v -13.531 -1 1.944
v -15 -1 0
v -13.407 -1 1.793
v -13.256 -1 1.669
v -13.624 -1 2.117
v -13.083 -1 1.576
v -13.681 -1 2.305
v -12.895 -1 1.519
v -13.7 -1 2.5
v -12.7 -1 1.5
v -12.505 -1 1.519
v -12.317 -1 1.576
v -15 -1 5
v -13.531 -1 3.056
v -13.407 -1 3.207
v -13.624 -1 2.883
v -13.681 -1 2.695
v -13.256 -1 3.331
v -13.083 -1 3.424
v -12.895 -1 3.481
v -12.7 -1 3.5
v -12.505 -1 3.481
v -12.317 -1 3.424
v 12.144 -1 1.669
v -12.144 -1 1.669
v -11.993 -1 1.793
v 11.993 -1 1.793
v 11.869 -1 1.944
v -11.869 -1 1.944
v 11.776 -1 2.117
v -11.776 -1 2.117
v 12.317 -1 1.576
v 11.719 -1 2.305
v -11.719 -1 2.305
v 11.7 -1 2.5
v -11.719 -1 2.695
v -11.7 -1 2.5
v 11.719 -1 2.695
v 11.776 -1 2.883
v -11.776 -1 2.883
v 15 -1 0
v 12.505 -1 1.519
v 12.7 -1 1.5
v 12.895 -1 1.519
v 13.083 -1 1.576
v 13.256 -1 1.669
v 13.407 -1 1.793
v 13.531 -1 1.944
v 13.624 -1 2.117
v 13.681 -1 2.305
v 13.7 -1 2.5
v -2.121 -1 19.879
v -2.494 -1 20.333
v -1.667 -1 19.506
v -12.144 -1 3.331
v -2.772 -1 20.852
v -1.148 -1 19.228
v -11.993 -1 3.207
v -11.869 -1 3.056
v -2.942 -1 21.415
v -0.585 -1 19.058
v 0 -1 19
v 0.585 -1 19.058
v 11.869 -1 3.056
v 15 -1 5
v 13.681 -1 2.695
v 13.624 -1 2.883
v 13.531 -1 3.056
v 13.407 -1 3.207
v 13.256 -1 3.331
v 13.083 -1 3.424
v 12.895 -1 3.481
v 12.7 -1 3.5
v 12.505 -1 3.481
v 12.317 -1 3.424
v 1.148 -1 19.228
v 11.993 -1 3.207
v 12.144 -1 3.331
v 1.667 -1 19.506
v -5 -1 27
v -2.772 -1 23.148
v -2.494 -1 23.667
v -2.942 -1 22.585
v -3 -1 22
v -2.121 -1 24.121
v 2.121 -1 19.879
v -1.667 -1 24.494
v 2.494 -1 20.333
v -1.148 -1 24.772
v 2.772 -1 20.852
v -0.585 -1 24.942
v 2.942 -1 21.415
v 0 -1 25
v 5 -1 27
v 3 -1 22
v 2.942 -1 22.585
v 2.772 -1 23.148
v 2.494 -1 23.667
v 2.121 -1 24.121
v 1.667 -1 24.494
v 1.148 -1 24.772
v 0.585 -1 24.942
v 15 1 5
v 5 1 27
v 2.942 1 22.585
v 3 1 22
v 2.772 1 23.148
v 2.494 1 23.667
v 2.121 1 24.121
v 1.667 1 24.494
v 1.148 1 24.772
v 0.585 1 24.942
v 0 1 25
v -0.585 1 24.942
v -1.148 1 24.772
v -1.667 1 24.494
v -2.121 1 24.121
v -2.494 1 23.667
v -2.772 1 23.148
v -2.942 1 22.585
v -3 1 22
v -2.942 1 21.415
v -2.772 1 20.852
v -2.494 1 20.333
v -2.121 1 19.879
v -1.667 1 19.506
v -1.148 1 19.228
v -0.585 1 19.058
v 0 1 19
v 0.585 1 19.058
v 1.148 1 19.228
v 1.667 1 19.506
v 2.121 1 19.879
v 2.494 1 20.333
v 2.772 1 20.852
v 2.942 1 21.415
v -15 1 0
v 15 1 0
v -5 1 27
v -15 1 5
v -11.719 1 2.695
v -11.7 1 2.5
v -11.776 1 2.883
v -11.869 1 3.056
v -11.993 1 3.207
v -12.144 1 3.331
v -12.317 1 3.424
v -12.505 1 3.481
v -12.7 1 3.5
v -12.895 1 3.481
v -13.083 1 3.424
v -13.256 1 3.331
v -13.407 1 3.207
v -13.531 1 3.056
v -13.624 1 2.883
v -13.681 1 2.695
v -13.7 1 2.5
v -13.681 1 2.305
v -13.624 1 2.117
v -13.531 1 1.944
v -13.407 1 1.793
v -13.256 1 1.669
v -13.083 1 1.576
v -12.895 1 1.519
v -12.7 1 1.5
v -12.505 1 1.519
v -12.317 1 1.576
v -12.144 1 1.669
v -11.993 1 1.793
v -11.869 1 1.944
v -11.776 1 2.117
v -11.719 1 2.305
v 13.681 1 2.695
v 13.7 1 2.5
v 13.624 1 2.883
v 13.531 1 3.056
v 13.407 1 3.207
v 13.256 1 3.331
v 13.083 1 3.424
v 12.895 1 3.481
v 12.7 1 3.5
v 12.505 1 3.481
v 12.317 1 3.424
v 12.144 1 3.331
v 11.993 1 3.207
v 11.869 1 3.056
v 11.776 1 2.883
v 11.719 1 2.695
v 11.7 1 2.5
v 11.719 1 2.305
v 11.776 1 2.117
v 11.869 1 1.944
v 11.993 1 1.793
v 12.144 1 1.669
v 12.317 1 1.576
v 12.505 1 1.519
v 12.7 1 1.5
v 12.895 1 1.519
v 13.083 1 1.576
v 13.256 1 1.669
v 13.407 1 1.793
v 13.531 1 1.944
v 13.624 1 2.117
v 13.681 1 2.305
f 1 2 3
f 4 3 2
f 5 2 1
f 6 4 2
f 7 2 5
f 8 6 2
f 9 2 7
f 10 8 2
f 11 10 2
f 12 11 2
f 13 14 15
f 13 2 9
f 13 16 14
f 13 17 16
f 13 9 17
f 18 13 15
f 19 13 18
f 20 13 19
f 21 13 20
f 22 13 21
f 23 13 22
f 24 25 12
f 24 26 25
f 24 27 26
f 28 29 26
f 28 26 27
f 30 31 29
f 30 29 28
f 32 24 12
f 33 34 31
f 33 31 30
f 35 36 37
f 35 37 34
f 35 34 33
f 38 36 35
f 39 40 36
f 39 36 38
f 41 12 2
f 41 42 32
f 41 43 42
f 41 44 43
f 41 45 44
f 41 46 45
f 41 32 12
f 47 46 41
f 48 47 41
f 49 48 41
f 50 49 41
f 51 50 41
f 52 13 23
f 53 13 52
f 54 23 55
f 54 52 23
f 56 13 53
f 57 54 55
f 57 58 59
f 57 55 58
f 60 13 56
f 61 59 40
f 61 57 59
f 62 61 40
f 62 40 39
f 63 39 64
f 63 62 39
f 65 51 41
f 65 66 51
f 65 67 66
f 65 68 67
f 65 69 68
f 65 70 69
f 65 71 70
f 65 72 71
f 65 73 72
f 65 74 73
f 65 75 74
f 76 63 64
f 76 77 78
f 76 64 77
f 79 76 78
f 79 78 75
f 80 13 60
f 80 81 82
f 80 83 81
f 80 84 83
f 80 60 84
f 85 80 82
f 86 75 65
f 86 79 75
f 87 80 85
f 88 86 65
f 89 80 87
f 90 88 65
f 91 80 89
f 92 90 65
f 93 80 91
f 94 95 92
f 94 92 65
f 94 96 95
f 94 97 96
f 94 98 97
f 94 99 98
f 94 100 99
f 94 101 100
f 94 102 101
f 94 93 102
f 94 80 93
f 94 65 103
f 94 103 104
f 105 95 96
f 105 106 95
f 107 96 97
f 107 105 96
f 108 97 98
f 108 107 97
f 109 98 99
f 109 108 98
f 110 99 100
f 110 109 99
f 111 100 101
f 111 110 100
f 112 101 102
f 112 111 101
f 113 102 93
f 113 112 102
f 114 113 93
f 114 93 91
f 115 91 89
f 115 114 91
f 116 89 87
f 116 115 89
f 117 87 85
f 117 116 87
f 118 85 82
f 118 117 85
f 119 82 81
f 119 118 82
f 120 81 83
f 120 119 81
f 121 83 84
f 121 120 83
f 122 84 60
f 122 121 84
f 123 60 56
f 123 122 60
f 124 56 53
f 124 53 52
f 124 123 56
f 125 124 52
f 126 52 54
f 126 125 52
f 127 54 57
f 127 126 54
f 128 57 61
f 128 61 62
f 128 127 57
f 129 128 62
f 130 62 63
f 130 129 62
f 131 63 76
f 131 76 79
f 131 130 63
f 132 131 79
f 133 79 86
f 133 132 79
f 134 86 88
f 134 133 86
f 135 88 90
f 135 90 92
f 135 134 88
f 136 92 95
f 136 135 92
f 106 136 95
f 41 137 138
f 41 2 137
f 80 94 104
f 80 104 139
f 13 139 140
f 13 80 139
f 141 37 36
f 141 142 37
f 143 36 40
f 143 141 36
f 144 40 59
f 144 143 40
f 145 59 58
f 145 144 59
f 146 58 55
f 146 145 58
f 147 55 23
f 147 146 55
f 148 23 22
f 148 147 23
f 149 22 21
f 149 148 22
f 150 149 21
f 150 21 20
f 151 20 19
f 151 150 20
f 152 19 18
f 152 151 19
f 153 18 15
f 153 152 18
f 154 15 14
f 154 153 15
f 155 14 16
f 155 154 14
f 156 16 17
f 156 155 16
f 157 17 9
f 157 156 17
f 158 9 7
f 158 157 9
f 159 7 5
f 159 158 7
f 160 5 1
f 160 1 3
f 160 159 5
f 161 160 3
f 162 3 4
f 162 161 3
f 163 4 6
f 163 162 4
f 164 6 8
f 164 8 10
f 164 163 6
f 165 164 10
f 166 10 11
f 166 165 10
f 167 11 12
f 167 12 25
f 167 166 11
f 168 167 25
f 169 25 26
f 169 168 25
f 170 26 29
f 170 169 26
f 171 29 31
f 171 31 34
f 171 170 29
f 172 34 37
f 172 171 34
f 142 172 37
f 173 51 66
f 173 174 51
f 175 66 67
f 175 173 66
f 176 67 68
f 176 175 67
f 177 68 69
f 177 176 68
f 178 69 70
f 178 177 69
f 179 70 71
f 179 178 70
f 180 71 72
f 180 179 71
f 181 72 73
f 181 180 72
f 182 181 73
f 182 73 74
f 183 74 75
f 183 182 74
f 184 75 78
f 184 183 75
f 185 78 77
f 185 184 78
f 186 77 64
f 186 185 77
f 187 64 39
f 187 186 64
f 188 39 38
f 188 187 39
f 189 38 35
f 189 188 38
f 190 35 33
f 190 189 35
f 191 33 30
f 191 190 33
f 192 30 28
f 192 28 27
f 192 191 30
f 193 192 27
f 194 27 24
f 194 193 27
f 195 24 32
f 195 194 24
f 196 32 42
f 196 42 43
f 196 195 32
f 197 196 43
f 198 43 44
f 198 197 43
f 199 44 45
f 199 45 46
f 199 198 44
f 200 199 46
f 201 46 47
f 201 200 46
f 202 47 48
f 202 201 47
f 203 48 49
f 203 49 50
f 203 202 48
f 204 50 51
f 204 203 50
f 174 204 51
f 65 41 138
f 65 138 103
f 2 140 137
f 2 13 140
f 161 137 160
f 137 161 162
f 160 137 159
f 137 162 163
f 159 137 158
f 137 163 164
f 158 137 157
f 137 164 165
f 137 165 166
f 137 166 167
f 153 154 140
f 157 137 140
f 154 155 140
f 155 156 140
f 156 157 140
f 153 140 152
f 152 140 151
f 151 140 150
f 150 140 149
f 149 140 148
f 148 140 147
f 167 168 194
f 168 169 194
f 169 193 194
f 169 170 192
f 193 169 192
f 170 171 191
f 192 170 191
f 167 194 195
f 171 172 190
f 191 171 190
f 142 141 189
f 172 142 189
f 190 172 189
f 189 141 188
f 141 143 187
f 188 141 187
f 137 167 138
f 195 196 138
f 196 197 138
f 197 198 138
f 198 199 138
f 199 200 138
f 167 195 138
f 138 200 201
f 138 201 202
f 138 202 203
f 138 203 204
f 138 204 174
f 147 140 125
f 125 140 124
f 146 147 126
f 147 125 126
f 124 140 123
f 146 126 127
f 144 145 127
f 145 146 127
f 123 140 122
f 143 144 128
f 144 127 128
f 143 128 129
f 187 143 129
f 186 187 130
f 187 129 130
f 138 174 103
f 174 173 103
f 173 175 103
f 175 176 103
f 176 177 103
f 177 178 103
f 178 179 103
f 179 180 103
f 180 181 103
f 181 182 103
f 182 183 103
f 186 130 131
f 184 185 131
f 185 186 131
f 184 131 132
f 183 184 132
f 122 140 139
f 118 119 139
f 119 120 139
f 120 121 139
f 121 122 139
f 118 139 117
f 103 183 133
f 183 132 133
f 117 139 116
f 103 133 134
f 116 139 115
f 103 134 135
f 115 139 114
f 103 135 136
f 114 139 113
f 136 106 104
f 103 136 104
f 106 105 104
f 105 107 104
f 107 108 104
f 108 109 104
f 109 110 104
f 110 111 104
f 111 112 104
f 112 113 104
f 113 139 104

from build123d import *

# Parameters (mm, degrees)
F0_R     = 1
F0_R_2   = 3
F1_DEPTH = 1


with BuildPart() as f1:
    # F0 (on Front) → F1 (new body, symmetric)
    with BuildSketch(Plane.XZ):
        Polygon((-15, 0), (0, 0), (15, 0), (15, 5), (5, 27), (0, 27), (-5, 27), (-15, 5), align=None)
        with Locations((-12.7, 2.5)):
            Circle(F0_R, mode=Mode.SUBTRACT)
        with Locations((12.7, 2.5)):
            Circle(F0_R, mode=Mode.SUBTRACT)
        with Locations((0, 22)):
            Circle(F0_R_2, mode=Mode.SUBTRACT)
    extrude(amount=F1_DEPTH, both=True)


solid = f1.part
